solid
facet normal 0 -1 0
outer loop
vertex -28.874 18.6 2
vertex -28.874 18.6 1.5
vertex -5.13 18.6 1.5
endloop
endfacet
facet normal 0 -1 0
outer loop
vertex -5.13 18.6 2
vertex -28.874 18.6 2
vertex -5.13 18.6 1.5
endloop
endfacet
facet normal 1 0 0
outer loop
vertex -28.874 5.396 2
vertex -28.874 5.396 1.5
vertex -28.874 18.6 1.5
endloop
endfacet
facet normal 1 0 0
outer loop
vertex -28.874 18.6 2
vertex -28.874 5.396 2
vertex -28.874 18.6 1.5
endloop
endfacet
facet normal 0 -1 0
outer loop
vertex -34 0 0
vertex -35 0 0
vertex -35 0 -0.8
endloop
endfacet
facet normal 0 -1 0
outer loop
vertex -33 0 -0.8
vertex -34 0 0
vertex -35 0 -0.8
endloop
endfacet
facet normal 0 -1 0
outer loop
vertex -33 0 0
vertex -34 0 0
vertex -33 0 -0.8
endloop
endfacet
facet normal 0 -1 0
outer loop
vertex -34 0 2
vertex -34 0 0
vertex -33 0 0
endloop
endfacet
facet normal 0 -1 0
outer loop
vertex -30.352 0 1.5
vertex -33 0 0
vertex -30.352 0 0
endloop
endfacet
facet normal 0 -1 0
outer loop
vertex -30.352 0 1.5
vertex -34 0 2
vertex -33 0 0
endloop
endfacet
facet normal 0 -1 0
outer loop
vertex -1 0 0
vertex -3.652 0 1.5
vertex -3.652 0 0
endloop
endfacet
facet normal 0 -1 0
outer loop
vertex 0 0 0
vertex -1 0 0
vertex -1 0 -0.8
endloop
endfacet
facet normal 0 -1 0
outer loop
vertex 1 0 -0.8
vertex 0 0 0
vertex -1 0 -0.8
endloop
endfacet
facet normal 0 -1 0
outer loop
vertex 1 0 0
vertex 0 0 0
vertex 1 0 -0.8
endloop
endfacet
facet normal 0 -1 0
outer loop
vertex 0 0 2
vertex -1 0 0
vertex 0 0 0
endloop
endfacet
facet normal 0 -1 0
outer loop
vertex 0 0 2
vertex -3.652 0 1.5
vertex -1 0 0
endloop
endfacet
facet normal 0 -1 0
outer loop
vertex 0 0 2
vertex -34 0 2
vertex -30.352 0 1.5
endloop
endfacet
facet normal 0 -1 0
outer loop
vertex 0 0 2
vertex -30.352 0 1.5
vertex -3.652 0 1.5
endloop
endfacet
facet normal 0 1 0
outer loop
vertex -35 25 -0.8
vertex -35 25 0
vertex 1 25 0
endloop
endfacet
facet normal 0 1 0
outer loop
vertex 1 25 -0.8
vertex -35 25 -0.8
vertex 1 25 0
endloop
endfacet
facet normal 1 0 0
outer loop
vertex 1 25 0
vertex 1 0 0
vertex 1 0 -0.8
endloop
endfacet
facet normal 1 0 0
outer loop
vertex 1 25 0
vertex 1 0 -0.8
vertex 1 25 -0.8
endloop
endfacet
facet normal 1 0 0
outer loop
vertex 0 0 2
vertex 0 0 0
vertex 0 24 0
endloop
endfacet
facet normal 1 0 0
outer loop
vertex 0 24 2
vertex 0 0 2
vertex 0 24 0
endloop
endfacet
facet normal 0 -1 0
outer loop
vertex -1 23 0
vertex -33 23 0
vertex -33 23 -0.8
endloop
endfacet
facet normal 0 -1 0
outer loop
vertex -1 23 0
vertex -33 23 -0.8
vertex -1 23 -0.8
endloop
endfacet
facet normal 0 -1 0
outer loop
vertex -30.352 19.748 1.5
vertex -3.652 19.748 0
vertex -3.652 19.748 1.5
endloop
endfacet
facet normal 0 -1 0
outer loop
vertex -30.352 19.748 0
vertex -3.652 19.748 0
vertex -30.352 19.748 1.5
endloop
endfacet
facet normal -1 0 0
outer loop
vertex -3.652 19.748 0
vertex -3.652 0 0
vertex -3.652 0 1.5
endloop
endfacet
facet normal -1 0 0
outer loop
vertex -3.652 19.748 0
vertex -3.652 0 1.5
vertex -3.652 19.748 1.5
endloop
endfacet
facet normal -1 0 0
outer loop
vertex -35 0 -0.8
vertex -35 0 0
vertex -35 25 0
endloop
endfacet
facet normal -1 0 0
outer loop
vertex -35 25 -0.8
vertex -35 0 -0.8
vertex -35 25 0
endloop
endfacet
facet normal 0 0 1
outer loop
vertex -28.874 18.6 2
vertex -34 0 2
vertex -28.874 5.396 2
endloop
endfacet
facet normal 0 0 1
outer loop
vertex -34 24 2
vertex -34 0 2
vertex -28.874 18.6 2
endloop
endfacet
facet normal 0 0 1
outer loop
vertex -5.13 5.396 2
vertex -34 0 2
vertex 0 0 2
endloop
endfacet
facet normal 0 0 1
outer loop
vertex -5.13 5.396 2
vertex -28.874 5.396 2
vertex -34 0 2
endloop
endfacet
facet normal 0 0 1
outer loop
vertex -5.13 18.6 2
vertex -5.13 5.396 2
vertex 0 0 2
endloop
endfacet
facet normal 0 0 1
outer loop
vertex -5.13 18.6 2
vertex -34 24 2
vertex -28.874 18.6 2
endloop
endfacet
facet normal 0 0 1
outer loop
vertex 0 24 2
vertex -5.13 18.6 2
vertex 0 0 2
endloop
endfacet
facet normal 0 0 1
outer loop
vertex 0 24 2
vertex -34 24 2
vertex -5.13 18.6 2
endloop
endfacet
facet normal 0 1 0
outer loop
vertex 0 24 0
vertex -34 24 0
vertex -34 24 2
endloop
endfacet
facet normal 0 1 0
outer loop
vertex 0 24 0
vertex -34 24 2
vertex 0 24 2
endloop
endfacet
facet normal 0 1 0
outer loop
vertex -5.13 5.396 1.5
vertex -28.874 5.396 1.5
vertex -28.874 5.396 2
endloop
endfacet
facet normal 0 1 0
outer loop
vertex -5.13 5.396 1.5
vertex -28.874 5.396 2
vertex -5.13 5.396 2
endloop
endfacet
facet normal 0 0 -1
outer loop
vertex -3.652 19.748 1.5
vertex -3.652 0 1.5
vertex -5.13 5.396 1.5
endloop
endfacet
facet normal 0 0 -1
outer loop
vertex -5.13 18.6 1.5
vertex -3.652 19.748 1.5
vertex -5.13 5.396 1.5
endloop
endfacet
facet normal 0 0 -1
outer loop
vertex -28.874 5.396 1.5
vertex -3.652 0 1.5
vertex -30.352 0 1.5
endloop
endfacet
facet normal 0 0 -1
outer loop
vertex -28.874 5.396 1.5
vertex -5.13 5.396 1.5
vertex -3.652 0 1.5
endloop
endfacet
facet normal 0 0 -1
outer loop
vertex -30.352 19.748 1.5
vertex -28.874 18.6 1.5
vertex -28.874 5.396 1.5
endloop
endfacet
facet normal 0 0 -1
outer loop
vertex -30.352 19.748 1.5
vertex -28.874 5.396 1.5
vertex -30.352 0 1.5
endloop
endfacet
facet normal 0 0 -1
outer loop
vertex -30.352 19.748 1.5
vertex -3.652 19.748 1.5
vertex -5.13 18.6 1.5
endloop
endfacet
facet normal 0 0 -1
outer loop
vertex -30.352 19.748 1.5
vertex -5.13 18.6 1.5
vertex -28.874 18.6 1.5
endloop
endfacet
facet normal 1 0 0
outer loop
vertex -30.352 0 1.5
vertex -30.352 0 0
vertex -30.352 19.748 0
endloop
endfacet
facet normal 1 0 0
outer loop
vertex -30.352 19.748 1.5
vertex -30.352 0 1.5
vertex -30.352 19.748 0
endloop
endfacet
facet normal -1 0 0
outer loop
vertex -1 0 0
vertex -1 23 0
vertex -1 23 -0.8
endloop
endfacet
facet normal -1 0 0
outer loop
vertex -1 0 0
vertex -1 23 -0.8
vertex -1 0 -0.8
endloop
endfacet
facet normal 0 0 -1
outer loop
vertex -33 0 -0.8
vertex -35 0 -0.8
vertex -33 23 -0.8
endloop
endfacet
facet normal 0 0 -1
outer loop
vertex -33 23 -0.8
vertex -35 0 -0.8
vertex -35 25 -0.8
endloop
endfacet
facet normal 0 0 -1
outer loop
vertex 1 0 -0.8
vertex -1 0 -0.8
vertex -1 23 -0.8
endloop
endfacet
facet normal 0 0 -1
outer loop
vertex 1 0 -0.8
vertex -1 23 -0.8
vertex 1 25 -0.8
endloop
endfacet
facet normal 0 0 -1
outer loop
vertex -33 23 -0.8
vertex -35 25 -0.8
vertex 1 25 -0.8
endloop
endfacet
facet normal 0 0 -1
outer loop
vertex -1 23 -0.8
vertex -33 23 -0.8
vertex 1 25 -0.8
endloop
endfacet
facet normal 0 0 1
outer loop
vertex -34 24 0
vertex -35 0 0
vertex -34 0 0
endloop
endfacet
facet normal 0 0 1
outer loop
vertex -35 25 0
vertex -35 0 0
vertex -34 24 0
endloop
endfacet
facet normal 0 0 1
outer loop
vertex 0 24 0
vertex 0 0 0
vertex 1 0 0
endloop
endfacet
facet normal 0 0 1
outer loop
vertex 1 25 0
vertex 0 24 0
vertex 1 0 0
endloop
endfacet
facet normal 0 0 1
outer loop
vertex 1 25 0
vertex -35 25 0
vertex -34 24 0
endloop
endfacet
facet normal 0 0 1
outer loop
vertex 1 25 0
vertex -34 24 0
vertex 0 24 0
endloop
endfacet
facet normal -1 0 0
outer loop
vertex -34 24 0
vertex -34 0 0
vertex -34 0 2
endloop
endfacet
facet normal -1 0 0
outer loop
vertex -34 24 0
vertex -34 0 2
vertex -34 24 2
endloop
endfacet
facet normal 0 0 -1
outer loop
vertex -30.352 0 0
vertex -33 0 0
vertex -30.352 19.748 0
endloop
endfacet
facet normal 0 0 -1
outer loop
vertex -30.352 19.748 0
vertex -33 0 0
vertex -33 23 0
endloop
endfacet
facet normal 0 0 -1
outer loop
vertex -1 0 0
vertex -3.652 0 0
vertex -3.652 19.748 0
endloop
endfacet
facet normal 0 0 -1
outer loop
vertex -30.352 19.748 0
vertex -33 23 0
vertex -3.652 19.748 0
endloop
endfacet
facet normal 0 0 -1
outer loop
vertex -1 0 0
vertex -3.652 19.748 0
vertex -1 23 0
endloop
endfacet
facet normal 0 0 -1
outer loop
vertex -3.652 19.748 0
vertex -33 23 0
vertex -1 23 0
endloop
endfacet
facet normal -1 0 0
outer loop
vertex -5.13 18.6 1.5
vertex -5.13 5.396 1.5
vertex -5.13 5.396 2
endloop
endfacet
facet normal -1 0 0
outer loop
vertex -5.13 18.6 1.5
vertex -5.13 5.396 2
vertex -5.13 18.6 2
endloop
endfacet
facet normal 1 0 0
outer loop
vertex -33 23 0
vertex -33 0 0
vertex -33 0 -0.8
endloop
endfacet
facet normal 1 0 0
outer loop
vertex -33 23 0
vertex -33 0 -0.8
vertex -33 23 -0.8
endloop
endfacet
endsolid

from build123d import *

# Parameters (mm, degrees)
SKETCH1_W           = 34
SKETCH1_H           = 24
SKETCH1_W_2         = 23.744
SKETCH1_H_2         = 13.204
BOSS_EXTRUDE1_DEPTH = 2
SKETCH3_W           = 26.7
SKETCH3_H           = 22
CUT_EXTRUDE1_DEPTH  = 1.5
BOSS_EXTRUDE2_DEPTH = 0.8


with BuildPart() as part:
    # Sketch1 → Boss-Extrude1 (new body)
    with BuildSketch(Plane.XY):
        with Locations((-17, 12)):
            Rectangle(SKETCH1_W, SKETCH1_H)
        with Locations((-17.002, 11.998)):
            Rectangle(SKETCH1_W_2, SKETCH1_H_2, mode=Mode.SUBTRACT)
    extrude(amount=BOSS_EXTRUDE1_DEPTH)

    # Sketch3 → Cut-Extrude1 (cut)
    with BuildSketch(Plane(origin=(0, 0, 0), x_dir=(-1, 0, 0), z_dir=(0, 0, -1))):
        with Locations((17.002, 8.748)):
            Rectangle(SKETCH3_W, SKETCH3_H)
    extrude(amount=-CUT_EXTRUDE1_DEPTH, mode=Mode.SUBTRACT)

    # Sketch4 → Boss-Extrude2 (add)
    with BuildSketch(Plane(origin=(0, 0, 0), x_dir=(-1, 0, 0), z_dir=(0, 0, -1))):
        Polygon((1, 0), (-1, 0), (-1, 25), (0.739142899, 25), (35, 25), (35, 23.055979858), (35, 0), (33, 0), (33, 23), (1, 23), align=None)
    extrude(amount=BOSS_EXTRUDE2_DEPTH)


solid = part.part
